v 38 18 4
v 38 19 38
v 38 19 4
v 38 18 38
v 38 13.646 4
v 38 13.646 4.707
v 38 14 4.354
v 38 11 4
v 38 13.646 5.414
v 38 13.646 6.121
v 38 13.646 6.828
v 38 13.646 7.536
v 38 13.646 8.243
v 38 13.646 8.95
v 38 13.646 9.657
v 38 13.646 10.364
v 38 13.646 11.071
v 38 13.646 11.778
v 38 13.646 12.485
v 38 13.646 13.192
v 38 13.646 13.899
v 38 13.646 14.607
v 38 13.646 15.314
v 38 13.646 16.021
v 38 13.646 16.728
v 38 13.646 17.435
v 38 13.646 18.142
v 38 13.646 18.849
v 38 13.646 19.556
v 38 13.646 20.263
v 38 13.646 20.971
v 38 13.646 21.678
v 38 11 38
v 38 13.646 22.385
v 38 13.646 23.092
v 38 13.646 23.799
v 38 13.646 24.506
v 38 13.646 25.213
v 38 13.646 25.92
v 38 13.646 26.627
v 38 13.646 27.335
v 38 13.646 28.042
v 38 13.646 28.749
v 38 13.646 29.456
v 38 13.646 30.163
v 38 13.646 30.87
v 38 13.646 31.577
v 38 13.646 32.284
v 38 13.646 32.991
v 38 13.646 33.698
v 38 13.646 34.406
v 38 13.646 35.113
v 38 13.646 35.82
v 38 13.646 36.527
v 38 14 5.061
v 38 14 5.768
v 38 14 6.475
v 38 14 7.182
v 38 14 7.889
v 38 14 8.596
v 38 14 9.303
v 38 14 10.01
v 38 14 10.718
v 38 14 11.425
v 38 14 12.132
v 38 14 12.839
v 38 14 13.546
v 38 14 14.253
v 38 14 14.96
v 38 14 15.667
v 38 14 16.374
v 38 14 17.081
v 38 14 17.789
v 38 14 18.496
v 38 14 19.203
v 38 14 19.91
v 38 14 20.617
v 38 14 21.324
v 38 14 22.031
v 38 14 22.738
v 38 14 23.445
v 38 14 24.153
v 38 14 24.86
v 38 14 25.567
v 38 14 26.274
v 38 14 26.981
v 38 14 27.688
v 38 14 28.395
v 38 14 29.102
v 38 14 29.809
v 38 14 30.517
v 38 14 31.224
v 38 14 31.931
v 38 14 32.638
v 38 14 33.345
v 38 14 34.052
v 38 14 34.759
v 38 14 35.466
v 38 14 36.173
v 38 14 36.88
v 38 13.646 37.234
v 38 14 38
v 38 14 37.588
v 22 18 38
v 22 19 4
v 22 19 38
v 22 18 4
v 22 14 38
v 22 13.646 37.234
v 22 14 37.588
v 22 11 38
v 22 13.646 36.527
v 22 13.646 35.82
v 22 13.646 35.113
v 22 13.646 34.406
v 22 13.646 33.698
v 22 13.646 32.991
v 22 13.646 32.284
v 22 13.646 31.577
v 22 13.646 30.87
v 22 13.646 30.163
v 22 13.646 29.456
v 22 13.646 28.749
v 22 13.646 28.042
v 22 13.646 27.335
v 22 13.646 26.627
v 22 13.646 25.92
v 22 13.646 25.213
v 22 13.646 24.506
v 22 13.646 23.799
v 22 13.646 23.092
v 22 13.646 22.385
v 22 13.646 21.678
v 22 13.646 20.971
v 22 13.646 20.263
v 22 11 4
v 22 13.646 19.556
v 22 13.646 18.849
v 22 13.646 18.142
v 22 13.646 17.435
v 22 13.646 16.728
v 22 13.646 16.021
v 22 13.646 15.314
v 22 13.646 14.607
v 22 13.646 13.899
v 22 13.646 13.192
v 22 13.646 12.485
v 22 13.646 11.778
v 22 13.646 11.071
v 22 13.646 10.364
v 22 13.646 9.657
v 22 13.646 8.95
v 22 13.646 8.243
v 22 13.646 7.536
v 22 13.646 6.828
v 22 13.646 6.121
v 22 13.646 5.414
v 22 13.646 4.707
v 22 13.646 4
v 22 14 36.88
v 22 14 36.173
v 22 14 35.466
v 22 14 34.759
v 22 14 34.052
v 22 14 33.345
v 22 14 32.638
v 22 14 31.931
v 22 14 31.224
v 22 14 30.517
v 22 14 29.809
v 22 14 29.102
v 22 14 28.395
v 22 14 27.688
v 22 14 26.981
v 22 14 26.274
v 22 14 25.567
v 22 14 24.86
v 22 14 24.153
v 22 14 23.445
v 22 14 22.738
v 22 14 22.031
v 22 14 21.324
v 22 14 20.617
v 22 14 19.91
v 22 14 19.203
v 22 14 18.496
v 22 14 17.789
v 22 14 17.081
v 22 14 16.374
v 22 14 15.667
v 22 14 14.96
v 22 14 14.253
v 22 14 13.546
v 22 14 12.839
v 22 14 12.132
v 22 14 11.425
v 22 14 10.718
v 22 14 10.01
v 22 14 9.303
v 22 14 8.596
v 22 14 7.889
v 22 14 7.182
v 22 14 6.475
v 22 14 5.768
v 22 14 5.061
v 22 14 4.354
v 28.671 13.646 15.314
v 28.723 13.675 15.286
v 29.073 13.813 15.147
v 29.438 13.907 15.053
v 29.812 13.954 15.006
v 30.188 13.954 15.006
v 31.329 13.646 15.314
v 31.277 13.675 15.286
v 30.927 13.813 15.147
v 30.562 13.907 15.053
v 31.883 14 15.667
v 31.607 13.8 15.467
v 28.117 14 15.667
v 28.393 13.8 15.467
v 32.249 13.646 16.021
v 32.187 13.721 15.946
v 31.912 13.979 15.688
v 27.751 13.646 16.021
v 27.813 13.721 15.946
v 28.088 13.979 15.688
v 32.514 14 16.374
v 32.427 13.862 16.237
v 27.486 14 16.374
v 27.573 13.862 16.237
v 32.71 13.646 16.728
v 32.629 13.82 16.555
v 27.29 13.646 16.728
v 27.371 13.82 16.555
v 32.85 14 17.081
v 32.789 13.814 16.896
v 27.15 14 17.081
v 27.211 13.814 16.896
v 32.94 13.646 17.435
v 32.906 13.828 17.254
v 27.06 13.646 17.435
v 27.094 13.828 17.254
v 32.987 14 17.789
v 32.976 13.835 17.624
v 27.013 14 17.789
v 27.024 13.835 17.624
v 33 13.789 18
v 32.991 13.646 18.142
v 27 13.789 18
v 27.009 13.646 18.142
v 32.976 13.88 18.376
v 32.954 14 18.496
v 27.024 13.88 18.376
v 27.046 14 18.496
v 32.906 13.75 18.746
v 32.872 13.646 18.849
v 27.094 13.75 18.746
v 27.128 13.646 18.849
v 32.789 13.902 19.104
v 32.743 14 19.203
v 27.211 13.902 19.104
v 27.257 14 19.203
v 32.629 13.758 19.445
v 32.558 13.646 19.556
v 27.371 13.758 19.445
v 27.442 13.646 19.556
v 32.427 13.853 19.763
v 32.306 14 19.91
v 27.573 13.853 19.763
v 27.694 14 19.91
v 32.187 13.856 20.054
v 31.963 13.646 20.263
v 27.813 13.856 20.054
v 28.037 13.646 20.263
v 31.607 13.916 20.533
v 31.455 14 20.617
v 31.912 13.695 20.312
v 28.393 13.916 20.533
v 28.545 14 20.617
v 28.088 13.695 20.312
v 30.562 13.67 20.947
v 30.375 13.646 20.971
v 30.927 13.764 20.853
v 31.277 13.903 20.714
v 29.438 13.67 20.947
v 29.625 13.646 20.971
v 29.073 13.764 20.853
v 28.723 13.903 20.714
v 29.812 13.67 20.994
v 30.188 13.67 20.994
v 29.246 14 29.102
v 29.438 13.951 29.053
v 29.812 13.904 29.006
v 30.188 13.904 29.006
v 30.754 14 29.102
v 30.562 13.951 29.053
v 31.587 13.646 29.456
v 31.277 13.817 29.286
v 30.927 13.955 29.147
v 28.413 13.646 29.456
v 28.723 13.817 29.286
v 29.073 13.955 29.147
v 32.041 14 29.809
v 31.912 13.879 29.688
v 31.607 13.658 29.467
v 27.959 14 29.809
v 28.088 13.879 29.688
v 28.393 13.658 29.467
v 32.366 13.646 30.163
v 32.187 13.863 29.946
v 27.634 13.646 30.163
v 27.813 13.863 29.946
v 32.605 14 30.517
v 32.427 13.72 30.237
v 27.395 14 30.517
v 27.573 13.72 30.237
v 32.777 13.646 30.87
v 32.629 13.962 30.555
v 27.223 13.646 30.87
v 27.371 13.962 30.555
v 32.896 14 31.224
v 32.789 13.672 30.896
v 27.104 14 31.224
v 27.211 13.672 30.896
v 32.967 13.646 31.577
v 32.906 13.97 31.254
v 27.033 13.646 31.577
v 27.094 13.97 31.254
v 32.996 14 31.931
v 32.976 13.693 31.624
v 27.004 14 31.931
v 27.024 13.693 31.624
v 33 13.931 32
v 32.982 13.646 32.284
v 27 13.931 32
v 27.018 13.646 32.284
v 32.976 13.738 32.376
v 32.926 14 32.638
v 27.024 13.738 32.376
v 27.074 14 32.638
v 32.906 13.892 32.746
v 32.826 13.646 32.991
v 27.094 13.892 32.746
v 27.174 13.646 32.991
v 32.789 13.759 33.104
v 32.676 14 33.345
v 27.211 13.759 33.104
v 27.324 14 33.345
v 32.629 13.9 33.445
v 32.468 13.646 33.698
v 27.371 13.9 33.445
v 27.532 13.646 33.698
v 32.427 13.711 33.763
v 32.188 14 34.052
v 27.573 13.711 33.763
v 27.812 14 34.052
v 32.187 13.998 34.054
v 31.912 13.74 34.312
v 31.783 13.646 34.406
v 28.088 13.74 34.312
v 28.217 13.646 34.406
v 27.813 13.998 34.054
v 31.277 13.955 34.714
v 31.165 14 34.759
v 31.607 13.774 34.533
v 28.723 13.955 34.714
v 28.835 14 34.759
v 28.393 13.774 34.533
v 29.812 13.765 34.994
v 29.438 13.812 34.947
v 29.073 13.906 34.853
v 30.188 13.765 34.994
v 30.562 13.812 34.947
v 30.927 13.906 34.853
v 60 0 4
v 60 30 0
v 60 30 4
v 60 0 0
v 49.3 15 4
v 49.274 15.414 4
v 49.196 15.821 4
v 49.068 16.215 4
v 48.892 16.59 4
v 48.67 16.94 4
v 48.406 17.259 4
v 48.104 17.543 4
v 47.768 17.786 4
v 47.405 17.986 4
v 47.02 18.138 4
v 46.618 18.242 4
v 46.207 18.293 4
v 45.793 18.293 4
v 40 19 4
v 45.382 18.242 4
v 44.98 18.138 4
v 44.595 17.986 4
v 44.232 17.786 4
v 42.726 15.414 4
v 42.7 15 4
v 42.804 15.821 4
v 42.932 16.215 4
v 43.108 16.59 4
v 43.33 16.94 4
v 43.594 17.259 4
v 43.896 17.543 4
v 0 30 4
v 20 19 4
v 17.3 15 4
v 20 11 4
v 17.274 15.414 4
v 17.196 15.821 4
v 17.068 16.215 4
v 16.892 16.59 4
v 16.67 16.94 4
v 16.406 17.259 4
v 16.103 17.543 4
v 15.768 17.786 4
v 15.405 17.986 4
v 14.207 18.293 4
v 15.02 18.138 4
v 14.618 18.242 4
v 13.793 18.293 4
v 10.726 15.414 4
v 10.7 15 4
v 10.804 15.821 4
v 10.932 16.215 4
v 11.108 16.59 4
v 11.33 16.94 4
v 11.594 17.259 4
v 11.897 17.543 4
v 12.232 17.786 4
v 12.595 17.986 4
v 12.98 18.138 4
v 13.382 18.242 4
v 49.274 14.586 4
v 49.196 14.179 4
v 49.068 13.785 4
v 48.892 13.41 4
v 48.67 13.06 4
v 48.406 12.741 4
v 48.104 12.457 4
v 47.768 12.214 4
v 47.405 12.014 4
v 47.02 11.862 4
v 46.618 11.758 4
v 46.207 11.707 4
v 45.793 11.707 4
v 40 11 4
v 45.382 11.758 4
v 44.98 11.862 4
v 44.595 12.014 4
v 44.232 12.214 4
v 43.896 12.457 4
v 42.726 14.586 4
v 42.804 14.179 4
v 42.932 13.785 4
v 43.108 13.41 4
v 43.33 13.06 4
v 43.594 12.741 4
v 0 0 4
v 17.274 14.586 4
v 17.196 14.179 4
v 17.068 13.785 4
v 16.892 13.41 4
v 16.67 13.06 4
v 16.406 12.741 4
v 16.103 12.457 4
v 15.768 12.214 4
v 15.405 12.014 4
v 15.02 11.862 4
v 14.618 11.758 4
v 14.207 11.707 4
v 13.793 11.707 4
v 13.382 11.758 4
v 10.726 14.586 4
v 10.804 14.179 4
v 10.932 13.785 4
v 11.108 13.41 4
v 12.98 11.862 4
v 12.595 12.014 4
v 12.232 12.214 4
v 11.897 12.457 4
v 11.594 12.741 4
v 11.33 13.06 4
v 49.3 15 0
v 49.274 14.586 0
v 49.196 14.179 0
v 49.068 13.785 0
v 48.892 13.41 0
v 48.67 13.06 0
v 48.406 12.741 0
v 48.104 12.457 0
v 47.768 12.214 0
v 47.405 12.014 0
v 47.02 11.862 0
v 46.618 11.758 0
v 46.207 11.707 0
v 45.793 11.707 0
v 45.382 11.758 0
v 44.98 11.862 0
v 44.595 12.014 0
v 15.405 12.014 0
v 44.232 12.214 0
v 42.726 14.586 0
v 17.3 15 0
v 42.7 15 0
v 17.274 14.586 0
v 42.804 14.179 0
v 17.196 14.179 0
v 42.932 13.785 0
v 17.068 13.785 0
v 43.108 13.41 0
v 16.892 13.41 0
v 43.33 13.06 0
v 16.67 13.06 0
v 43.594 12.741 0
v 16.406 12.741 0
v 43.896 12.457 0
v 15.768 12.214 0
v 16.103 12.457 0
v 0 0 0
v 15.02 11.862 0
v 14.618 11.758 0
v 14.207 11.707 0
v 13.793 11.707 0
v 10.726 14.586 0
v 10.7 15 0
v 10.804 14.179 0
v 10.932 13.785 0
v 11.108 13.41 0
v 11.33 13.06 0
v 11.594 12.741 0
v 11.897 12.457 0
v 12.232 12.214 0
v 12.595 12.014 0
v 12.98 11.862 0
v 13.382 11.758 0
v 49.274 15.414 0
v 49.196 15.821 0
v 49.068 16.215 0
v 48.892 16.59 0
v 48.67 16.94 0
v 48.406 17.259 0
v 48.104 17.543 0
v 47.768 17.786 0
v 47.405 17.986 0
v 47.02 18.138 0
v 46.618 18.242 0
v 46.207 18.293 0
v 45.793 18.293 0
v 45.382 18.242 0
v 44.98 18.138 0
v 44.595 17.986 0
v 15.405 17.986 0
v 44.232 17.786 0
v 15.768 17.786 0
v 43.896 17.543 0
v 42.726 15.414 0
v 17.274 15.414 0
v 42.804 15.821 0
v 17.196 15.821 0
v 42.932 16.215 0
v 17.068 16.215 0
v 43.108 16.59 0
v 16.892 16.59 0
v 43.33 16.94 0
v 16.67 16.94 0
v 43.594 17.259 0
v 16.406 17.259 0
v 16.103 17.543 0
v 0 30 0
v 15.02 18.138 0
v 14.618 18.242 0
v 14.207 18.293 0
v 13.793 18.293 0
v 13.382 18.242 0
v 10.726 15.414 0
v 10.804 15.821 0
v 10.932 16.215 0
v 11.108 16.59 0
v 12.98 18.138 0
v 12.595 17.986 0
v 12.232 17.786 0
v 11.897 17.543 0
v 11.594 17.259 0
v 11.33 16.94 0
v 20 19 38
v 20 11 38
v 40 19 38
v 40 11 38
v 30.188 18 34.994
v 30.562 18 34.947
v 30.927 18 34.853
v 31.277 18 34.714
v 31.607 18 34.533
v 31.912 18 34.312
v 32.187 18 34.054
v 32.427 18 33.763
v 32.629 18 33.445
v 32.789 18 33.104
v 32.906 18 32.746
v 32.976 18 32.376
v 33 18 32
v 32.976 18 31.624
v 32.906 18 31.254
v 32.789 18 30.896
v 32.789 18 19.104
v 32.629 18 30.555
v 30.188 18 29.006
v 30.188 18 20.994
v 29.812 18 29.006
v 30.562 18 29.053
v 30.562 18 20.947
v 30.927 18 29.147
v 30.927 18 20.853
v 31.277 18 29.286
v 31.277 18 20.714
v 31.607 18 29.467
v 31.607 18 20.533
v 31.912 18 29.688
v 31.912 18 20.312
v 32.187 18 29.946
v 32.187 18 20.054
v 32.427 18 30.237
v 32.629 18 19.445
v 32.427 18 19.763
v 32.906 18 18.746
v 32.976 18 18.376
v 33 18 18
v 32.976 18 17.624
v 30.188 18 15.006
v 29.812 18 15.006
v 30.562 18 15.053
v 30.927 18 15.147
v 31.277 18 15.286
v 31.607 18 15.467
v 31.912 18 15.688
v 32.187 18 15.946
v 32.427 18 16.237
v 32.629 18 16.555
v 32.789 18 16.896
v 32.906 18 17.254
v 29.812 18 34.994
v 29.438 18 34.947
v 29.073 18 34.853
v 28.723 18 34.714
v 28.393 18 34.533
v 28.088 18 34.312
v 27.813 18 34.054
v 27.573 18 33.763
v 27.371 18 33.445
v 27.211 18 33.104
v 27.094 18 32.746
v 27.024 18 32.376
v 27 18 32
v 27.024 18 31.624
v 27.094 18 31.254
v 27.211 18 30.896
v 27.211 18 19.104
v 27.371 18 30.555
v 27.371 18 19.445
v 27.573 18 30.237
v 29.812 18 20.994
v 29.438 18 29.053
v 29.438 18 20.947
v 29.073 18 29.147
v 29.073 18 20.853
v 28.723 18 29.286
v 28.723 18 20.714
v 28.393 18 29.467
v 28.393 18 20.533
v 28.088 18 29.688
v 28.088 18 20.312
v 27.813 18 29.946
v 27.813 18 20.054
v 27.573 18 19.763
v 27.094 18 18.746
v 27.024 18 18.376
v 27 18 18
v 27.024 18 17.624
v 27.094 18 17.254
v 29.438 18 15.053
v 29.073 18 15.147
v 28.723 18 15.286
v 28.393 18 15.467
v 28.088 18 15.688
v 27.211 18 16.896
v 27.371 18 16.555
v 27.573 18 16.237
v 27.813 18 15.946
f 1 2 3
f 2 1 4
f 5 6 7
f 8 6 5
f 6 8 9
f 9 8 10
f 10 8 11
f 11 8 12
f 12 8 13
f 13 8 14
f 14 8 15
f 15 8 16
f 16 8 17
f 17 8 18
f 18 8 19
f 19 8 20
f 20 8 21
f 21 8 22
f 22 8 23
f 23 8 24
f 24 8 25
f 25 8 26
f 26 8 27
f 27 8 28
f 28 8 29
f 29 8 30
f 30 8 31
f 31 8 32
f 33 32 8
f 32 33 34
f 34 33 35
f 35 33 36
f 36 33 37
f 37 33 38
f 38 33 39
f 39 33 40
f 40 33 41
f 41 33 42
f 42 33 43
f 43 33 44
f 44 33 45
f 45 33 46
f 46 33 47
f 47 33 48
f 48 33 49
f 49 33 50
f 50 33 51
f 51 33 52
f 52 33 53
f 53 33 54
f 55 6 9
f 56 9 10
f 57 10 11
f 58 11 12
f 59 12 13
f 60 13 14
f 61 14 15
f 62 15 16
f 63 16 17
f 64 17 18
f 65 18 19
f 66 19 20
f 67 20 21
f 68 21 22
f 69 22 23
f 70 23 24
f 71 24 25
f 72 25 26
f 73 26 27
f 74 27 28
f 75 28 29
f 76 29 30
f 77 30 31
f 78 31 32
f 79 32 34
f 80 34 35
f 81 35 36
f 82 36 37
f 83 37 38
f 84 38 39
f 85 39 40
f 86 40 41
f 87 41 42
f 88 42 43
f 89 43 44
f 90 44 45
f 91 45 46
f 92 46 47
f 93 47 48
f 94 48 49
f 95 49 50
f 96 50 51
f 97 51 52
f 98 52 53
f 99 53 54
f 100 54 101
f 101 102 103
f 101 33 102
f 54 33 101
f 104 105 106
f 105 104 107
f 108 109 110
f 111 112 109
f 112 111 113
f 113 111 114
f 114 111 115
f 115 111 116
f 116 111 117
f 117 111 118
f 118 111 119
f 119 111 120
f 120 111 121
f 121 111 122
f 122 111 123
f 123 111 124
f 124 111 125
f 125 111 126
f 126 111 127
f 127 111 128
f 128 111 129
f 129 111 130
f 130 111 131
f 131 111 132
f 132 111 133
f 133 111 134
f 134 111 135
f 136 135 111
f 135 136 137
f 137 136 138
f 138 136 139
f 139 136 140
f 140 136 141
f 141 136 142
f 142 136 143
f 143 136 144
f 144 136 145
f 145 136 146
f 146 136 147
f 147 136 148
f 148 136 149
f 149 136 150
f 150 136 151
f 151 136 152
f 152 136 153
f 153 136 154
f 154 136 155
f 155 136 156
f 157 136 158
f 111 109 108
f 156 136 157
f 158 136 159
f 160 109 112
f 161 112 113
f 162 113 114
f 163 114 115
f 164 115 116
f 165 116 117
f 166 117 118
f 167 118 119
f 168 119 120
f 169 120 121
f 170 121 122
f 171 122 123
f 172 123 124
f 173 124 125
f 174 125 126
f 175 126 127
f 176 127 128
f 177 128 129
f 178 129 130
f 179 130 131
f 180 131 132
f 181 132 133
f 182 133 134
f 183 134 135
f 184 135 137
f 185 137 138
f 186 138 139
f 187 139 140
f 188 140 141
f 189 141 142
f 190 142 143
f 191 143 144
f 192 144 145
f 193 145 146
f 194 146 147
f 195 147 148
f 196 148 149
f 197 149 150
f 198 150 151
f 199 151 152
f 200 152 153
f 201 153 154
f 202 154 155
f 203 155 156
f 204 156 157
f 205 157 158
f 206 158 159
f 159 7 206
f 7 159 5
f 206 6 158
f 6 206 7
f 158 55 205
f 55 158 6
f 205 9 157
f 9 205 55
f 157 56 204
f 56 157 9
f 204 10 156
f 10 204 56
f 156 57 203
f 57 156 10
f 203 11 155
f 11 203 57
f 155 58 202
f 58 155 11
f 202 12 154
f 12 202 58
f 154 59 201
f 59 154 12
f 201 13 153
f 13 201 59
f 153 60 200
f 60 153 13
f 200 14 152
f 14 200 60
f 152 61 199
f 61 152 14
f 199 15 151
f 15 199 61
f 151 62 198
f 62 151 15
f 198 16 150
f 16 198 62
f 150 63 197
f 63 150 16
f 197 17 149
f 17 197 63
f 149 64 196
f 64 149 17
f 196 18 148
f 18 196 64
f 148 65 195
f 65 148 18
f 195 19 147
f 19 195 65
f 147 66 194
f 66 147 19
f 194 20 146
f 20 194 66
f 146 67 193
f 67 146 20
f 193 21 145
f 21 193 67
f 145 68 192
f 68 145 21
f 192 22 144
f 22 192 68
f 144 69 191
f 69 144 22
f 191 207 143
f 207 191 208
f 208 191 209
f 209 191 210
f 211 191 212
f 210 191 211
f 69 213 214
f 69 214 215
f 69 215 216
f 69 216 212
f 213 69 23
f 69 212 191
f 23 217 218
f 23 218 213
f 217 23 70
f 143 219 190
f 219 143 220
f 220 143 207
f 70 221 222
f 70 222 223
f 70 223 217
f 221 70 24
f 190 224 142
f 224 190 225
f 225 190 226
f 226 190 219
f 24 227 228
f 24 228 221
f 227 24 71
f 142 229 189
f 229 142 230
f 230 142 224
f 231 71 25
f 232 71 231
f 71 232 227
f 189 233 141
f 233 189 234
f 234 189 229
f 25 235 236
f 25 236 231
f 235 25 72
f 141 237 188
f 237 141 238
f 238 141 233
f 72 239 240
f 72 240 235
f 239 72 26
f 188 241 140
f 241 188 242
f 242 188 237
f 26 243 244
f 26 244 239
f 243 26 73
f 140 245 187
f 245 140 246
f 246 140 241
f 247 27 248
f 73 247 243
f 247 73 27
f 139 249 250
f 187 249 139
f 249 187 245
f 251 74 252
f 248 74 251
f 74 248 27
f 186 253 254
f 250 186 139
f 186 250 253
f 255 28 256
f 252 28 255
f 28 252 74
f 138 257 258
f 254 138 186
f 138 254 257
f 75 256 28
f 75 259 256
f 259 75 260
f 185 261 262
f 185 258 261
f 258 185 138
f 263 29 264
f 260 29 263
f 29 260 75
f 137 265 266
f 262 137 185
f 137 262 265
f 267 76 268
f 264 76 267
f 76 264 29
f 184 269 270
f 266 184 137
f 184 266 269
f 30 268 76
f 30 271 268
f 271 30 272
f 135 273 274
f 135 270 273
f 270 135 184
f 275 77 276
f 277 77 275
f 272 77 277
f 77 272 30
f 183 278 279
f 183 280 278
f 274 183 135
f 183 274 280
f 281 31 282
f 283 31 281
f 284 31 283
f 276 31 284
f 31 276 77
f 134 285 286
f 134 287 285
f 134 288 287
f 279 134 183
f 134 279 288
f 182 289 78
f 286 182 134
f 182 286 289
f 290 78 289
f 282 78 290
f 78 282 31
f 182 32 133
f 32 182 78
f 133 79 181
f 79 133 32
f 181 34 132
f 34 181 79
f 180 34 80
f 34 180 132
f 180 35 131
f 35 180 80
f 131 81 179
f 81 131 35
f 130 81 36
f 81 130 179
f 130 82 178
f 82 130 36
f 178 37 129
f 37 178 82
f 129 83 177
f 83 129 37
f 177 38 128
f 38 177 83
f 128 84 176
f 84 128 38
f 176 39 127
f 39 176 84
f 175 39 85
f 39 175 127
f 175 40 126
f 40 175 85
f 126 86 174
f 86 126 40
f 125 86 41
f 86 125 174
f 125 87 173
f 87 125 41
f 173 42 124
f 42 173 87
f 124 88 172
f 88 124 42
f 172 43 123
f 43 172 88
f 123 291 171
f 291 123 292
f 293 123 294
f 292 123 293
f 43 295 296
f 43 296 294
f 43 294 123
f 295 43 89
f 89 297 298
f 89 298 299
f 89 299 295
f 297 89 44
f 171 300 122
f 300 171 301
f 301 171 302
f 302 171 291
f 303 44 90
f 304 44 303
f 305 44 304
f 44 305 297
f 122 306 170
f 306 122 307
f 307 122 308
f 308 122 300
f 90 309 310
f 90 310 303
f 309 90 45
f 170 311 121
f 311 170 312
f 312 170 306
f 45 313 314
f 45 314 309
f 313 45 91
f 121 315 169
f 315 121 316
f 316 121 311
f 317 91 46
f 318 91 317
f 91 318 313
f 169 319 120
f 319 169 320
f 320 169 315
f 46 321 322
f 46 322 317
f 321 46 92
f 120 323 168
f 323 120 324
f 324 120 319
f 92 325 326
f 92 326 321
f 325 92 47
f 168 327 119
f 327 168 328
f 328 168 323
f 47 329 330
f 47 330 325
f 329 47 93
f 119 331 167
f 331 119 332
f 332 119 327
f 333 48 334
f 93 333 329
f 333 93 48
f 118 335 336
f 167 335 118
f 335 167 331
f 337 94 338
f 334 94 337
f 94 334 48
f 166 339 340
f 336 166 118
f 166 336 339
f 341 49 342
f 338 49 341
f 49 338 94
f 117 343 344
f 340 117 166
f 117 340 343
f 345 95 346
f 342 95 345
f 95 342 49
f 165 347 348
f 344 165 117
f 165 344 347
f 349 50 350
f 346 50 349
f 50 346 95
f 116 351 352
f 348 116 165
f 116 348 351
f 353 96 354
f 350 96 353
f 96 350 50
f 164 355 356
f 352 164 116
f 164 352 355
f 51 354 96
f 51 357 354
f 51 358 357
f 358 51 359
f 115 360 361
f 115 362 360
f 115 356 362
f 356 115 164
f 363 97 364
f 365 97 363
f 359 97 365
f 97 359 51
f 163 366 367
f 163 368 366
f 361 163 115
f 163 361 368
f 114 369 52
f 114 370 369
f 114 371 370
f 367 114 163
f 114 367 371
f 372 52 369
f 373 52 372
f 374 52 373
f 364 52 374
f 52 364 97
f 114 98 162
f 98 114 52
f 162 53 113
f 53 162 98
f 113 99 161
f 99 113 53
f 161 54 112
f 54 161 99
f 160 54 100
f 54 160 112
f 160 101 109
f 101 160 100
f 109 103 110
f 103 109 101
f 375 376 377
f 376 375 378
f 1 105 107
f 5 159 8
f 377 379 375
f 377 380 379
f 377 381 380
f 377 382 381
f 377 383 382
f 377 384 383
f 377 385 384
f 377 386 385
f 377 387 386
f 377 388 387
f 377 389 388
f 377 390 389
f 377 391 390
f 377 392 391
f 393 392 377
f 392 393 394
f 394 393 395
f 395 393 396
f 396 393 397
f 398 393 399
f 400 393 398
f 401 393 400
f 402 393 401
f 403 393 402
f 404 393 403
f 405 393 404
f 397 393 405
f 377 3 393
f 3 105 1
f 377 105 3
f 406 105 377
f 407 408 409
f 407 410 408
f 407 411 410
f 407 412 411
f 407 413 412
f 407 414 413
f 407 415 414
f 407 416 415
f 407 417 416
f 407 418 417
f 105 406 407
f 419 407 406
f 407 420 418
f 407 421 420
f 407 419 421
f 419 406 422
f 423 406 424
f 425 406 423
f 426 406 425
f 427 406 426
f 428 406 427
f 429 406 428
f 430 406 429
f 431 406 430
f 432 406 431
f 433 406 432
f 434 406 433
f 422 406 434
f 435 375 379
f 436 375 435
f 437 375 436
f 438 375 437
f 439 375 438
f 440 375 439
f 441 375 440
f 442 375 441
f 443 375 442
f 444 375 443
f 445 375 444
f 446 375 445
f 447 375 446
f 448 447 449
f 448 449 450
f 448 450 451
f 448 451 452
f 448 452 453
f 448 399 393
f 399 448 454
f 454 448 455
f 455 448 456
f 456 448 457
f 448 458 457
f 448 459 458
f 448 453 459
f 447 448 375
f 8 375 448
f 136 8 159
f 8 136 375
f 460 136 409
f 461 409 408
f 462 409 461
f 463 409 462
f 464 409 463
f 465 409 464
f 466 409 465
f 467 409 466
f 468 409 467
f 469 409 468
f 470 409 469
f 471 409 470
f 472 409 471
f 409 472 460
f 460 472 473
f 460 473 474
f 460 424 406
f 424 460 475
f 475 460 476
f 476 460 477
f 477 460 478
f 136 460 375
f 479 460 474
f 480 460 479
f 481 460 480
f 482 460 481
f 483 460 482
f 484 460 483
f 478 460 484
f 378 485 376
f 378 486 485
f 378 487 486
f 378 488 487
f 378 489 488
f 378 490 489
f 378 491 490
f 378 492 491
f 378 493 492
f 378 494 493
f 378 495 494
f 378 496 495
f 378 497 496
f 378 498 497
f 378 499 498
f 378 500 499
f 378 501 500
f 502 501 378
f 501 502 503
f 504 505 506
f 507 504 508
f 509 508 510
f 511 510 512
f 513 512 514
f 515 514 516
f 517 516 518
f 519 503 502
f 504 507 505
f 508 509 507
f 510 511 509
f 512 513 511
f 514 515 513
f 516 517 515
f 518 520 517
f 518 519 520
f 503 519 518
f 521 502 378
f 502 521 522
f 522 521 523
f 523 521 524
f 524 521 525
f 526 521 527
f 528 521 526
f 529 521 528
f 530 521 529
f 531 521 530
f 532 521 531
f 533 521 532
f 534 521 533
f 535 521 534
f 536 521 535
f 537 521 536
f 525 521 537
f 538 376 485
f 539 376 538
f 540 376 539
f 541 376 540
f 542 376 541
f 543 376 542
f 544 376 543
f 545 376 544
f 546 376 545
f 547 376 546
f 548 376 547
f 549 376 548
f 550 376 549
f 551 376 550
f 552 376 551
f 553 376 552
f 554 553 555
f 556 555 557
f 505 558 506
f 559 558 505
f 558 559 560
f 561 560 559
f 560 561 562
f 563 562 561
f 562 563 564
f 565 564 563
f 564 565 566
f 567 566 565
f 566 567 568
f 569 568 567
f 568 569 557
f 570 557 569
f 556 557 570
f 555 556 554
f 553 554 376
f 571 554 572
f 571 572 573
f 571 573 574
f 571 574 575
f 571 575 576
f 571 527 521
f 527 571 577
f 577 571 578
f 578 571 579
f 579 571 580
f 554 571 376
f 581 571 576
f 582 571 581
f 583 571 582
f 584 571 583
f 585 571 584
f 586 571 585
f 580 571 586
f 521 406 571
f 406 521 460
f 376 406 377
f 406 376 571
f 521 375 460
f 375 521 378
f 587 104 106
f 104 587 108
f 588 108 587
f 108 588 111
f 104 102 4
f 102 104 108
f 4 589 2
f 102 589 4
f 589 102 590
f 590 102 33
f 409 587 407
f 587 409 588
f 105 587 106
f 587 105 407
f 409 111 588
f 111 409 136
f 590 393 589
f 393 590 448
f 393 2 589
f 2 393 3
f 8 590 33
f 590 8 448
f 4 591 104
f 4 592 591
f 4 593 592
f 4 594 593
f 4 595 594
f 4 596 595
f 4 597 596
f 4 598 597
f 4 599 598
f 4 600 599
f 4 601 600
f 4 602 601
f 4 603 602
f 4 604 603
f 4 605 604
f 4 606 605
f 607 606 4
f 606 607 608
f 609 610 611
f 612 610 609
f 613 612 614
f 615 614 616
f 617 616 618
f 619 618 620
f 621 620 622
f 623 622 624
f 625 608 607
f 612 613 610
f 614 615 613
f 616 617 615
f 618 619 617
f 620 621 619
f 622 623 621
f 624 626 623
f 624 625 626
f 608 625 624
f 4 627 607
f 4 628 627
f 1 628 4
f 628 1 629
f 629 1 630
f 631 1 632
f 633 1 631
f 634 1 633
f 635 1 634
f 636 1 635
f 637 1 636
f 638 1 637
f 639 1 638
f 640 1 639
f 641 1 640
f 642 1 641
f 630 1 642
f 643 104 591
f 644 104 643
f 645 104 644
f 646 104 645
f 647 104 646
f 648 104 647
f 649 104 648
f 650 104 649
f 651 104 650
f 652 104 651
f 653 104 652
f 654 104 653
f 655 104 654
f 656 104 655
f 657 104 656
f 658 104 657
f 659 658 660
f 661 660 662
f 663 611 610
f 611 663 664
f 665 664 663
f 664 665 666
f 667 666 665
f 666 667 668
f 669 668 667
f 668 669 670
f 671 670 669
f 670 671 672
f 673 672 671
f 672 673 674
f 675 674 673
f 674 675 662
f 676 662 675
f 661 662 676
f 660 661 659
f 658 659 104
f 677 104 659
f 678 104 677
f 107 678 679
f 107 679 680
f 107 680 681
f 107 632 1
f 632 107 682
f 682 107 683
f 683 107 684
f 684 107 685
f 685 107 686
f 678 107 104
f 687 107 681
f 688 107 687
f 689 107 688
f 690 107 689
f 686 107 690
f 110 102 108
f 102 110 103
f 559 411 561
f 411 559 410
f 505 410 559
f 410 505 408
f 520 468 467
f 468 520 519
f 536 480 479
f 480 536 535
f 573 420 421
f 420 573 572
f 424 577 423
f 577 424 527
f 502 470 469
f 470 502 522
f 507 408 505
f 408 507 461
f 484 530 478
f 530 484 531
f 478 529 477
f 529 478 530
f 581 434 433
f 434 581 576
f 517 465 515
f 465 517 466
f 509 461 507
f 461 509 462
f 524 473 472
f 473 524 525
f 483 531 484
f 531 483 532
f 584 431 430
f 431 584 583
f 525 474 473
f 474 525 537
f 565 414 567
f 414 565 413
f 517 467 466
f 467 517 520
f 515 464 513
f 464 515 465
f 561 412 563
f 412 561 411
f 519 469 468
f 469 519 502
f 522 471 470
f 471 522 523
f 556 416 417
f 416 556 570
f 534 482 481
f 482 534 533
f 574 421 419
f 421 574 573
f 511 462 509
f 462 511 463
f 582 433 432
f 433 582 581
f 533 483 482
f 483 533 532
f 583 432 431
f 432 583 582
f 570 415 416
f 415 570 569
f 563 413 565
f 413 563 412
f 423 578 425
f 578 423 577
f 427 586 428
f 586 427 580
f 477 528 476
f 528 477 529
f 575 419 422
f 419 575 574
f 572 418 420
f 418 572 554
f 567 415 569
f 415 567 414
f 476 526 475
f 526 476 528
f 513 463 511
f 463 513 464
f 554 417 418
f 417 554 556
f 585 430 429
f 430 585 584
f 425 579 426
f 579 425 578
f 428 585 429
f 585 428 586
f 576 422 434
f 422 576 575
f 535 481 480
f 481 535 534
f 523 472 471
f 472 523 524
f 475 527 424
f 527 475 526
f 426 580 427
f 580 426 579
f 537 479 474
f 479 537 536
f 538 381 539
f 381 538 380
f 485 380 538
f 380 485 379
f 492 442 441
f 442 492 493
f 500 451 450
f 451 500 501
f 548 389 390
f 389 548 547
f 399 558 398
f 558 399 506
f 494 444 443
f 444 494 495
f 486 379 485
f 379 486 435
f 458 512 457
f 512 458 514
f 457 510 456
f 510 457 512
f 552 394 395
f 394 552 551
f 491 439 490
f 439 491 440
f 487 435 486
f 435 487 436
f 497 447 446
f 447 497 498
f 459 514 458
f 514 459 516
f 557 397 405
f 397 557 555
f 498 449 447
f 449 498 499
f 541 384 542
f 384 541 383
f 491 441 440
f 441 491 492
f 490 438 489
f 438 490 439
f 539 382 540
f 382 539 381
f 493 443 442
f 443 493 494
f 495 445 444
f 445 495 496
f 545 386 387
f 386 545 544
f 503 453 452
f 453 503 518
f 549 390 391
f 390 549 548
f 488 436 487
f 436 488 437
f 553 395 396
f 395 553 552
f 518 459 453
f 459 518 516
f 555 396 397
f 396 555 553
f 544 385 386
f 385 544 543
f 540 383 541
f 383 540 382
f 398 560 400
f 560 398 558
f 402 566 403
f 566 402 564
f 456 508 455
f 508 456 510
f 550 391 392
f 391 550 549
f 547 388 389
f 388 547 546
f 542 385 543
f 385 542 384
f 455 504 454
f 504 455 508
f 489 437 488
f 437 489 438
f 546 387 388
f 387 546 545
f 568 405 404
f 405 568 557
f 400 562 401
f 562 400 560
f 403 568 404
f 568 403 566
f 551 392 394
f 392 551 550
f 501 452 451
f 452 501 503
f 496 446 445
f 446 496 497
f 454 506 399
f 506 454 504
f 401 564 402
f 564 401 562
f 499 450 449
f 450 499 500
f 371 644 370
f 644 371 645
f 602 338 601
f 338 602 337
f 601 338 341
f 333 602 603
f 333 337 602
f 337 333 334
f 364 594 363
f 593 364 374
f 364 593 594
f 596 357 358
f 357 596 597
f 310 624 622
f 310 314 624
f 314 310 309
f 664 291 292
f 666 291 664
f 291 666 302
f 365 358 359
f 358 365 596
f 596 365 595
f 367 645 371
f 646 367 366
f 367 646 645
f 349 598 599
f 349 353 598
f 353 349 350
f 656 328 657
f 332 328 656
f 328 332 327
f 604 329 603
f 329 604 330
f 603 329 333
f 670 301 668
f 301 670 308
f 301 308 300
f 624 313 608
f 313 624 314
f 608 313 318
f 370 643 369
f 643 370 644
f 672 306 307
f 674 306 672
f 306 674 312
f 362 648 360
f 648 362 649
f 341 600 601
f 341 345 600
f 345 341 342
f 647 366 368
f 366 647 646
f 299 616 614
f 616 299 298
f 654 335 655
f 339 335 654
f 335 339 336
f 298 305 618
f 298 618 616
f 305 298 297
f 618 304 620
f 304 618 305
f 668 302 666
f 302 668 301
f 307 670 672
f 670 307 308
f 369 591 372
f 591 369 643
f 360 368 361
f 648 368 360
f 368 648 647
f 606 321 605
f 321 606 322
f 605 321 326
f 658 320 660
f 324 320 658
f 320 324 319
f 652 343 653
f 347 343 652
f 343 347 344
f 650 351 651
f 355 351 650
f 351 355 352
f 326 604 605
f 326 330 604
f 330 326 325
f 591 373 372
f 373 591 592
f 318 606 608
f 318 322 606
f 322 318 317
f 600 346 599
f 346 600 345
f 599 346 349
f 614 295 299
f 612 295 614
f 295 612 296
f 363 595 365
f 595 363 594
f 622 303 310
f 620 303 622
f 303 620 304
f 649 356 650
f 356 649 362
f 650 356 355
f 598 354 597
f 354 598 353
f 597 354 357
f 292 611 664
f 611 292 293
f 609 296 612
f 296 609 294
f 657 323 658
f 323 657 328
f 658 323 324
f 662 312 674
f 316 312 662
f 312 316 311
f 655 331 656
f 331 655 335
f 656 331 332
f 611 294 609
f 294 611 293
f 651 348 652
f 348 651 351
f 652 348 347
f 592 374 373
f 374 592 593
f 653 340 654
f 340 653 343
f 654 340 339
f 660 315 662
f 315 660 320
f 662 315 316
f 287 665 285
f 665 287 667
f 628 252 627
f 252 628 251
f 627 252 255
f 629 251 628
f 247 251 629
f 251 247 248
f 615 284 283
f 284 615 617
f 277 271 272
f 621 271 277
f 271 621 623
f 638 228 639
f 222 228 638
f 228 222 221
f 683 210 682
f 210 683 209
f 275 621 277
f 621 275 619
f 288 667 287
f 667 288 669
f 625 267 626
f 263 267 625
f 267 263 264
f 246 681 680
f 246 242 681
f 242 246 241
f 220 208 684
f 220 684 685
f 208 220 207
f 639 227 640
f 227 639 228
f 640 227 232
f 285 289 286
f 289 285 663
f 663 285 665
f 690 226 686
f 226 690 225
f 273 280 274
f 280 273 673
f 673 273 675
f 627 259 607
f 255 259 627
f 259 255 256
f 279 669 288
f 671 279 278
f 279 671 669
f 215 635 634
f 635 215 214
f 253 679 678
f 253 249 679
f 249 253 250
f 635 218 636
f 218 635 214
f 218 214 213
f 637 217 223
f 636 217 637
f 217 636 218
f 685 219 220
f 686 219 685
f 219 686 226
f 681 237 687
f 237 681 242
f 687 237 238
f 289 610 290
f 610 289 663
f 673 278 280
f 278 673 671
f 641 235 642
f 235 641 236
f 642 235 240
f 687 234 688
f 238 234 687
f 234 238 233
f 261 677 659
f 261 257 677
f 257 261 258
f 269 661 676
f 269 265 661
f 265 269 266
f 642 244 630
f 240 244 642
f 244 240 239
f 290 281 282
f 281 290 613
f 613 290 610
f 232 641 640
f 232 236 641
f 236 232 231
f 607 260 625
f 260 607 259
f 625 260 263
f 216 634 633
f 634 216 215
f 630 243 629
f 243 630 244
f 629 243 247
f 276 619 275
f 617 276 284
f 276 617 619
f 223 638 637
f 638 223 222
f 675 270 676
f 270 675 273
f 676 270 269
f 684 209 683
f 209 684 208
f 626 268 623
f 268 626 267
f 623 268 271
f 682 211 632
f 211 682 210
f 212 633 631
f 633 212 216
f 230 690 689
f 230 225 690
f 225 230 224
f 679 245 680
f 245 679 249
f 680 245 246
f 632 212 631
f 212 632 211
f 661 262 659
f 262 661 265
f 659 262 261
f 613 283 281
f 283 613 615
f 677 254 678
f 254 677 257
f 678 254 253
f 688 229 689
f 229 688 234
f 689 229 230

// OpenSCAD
// file: serrated45_plane.scad
// serration using cubes




module serrated45_plane (pitch, length, width) {
    union () {
        for(i = [0:(length - 1)]) {
            translate([i * cos(45), 0, 0])
            rotate([0,0,45])
            cube( [pitch, pitch, width], center = true);
        }
    }
    {
        plane_length = pitch * cos(45) * 2 * length;
        translate([plane_length/2, - pitch/2 * 0.95, 0])
        cube([plane_length, pitch/2, width], center = true);
    }
}


// serrated45_plane (0.5, 80, 18);
// main file
include <serrated45_plane.scad>;

// GPU brace - bottom
// M6 screws
// 
// printing
// - 0.1 precision, gradual infill - does not work
//   0.06 precision, 80% infile - 


// GPU is about 49mm above the deck
// base is 36 + 4 = 40 mm
// mating holes:
// - 18 mm
// - 36 mm

base_mount_cl = 32;
base_mount_screw_dia = 6;

base_width = 30;
base_length = 60;
base_thickness = 4;
// flat base

// M6 mounting - by mistake
mating_screw_dia = 6;

$fn = 50;



difference () {
    {
    union () {
        // flat base
        cube([base_length, base_width, base_thickness], center = false);
        
        // flanges
        translate([base_length/2 - 10,base_width/2 - 8/2,base_thickness])
        cube([2,8,34], center = false);
        
        translate([base_length/2 + 10 - 2,base_width/2 - 8/2,base_thickness])
        cube([2,8,34], center = false);
        
        // center
        translate([base_length/2 - 9,base_width/2 - 1,base_thickness])
        cube([18,4,34], center = false);        
        
        // serration
        translate([base_length/2, base_width/2 - 1, base_thickness])
        rotate([180,-90,0])
        serrated45_plane(0.5, 48, 16);
        }
    }
    {
    translate([(base_length/2 - base_mount_cl/2), base_width/2, 0])
    cylinder(r = (base_mount_screw_dia/2) * 1.1, h = base_thickness, center = false);
    translate([(base_length/2 + base_mount_cl/2), base_width/2, 0])
    cylinder(r = (base_mount_screw_dia/2) * 1.1, h = base_thickness, center = false);
        

    translate([base_length/2, base_width/2, 32])
    rotate([90,0,0])
    cylinder(r = mating_screw_dia/2, h = 6, center = true);
        
    translate([base_length/2, base_width/2, 18])
    rotate([90,0,0])
    cylinder(r = mating_screw_dia/2, h = 6, center = true);
    

    }
}
